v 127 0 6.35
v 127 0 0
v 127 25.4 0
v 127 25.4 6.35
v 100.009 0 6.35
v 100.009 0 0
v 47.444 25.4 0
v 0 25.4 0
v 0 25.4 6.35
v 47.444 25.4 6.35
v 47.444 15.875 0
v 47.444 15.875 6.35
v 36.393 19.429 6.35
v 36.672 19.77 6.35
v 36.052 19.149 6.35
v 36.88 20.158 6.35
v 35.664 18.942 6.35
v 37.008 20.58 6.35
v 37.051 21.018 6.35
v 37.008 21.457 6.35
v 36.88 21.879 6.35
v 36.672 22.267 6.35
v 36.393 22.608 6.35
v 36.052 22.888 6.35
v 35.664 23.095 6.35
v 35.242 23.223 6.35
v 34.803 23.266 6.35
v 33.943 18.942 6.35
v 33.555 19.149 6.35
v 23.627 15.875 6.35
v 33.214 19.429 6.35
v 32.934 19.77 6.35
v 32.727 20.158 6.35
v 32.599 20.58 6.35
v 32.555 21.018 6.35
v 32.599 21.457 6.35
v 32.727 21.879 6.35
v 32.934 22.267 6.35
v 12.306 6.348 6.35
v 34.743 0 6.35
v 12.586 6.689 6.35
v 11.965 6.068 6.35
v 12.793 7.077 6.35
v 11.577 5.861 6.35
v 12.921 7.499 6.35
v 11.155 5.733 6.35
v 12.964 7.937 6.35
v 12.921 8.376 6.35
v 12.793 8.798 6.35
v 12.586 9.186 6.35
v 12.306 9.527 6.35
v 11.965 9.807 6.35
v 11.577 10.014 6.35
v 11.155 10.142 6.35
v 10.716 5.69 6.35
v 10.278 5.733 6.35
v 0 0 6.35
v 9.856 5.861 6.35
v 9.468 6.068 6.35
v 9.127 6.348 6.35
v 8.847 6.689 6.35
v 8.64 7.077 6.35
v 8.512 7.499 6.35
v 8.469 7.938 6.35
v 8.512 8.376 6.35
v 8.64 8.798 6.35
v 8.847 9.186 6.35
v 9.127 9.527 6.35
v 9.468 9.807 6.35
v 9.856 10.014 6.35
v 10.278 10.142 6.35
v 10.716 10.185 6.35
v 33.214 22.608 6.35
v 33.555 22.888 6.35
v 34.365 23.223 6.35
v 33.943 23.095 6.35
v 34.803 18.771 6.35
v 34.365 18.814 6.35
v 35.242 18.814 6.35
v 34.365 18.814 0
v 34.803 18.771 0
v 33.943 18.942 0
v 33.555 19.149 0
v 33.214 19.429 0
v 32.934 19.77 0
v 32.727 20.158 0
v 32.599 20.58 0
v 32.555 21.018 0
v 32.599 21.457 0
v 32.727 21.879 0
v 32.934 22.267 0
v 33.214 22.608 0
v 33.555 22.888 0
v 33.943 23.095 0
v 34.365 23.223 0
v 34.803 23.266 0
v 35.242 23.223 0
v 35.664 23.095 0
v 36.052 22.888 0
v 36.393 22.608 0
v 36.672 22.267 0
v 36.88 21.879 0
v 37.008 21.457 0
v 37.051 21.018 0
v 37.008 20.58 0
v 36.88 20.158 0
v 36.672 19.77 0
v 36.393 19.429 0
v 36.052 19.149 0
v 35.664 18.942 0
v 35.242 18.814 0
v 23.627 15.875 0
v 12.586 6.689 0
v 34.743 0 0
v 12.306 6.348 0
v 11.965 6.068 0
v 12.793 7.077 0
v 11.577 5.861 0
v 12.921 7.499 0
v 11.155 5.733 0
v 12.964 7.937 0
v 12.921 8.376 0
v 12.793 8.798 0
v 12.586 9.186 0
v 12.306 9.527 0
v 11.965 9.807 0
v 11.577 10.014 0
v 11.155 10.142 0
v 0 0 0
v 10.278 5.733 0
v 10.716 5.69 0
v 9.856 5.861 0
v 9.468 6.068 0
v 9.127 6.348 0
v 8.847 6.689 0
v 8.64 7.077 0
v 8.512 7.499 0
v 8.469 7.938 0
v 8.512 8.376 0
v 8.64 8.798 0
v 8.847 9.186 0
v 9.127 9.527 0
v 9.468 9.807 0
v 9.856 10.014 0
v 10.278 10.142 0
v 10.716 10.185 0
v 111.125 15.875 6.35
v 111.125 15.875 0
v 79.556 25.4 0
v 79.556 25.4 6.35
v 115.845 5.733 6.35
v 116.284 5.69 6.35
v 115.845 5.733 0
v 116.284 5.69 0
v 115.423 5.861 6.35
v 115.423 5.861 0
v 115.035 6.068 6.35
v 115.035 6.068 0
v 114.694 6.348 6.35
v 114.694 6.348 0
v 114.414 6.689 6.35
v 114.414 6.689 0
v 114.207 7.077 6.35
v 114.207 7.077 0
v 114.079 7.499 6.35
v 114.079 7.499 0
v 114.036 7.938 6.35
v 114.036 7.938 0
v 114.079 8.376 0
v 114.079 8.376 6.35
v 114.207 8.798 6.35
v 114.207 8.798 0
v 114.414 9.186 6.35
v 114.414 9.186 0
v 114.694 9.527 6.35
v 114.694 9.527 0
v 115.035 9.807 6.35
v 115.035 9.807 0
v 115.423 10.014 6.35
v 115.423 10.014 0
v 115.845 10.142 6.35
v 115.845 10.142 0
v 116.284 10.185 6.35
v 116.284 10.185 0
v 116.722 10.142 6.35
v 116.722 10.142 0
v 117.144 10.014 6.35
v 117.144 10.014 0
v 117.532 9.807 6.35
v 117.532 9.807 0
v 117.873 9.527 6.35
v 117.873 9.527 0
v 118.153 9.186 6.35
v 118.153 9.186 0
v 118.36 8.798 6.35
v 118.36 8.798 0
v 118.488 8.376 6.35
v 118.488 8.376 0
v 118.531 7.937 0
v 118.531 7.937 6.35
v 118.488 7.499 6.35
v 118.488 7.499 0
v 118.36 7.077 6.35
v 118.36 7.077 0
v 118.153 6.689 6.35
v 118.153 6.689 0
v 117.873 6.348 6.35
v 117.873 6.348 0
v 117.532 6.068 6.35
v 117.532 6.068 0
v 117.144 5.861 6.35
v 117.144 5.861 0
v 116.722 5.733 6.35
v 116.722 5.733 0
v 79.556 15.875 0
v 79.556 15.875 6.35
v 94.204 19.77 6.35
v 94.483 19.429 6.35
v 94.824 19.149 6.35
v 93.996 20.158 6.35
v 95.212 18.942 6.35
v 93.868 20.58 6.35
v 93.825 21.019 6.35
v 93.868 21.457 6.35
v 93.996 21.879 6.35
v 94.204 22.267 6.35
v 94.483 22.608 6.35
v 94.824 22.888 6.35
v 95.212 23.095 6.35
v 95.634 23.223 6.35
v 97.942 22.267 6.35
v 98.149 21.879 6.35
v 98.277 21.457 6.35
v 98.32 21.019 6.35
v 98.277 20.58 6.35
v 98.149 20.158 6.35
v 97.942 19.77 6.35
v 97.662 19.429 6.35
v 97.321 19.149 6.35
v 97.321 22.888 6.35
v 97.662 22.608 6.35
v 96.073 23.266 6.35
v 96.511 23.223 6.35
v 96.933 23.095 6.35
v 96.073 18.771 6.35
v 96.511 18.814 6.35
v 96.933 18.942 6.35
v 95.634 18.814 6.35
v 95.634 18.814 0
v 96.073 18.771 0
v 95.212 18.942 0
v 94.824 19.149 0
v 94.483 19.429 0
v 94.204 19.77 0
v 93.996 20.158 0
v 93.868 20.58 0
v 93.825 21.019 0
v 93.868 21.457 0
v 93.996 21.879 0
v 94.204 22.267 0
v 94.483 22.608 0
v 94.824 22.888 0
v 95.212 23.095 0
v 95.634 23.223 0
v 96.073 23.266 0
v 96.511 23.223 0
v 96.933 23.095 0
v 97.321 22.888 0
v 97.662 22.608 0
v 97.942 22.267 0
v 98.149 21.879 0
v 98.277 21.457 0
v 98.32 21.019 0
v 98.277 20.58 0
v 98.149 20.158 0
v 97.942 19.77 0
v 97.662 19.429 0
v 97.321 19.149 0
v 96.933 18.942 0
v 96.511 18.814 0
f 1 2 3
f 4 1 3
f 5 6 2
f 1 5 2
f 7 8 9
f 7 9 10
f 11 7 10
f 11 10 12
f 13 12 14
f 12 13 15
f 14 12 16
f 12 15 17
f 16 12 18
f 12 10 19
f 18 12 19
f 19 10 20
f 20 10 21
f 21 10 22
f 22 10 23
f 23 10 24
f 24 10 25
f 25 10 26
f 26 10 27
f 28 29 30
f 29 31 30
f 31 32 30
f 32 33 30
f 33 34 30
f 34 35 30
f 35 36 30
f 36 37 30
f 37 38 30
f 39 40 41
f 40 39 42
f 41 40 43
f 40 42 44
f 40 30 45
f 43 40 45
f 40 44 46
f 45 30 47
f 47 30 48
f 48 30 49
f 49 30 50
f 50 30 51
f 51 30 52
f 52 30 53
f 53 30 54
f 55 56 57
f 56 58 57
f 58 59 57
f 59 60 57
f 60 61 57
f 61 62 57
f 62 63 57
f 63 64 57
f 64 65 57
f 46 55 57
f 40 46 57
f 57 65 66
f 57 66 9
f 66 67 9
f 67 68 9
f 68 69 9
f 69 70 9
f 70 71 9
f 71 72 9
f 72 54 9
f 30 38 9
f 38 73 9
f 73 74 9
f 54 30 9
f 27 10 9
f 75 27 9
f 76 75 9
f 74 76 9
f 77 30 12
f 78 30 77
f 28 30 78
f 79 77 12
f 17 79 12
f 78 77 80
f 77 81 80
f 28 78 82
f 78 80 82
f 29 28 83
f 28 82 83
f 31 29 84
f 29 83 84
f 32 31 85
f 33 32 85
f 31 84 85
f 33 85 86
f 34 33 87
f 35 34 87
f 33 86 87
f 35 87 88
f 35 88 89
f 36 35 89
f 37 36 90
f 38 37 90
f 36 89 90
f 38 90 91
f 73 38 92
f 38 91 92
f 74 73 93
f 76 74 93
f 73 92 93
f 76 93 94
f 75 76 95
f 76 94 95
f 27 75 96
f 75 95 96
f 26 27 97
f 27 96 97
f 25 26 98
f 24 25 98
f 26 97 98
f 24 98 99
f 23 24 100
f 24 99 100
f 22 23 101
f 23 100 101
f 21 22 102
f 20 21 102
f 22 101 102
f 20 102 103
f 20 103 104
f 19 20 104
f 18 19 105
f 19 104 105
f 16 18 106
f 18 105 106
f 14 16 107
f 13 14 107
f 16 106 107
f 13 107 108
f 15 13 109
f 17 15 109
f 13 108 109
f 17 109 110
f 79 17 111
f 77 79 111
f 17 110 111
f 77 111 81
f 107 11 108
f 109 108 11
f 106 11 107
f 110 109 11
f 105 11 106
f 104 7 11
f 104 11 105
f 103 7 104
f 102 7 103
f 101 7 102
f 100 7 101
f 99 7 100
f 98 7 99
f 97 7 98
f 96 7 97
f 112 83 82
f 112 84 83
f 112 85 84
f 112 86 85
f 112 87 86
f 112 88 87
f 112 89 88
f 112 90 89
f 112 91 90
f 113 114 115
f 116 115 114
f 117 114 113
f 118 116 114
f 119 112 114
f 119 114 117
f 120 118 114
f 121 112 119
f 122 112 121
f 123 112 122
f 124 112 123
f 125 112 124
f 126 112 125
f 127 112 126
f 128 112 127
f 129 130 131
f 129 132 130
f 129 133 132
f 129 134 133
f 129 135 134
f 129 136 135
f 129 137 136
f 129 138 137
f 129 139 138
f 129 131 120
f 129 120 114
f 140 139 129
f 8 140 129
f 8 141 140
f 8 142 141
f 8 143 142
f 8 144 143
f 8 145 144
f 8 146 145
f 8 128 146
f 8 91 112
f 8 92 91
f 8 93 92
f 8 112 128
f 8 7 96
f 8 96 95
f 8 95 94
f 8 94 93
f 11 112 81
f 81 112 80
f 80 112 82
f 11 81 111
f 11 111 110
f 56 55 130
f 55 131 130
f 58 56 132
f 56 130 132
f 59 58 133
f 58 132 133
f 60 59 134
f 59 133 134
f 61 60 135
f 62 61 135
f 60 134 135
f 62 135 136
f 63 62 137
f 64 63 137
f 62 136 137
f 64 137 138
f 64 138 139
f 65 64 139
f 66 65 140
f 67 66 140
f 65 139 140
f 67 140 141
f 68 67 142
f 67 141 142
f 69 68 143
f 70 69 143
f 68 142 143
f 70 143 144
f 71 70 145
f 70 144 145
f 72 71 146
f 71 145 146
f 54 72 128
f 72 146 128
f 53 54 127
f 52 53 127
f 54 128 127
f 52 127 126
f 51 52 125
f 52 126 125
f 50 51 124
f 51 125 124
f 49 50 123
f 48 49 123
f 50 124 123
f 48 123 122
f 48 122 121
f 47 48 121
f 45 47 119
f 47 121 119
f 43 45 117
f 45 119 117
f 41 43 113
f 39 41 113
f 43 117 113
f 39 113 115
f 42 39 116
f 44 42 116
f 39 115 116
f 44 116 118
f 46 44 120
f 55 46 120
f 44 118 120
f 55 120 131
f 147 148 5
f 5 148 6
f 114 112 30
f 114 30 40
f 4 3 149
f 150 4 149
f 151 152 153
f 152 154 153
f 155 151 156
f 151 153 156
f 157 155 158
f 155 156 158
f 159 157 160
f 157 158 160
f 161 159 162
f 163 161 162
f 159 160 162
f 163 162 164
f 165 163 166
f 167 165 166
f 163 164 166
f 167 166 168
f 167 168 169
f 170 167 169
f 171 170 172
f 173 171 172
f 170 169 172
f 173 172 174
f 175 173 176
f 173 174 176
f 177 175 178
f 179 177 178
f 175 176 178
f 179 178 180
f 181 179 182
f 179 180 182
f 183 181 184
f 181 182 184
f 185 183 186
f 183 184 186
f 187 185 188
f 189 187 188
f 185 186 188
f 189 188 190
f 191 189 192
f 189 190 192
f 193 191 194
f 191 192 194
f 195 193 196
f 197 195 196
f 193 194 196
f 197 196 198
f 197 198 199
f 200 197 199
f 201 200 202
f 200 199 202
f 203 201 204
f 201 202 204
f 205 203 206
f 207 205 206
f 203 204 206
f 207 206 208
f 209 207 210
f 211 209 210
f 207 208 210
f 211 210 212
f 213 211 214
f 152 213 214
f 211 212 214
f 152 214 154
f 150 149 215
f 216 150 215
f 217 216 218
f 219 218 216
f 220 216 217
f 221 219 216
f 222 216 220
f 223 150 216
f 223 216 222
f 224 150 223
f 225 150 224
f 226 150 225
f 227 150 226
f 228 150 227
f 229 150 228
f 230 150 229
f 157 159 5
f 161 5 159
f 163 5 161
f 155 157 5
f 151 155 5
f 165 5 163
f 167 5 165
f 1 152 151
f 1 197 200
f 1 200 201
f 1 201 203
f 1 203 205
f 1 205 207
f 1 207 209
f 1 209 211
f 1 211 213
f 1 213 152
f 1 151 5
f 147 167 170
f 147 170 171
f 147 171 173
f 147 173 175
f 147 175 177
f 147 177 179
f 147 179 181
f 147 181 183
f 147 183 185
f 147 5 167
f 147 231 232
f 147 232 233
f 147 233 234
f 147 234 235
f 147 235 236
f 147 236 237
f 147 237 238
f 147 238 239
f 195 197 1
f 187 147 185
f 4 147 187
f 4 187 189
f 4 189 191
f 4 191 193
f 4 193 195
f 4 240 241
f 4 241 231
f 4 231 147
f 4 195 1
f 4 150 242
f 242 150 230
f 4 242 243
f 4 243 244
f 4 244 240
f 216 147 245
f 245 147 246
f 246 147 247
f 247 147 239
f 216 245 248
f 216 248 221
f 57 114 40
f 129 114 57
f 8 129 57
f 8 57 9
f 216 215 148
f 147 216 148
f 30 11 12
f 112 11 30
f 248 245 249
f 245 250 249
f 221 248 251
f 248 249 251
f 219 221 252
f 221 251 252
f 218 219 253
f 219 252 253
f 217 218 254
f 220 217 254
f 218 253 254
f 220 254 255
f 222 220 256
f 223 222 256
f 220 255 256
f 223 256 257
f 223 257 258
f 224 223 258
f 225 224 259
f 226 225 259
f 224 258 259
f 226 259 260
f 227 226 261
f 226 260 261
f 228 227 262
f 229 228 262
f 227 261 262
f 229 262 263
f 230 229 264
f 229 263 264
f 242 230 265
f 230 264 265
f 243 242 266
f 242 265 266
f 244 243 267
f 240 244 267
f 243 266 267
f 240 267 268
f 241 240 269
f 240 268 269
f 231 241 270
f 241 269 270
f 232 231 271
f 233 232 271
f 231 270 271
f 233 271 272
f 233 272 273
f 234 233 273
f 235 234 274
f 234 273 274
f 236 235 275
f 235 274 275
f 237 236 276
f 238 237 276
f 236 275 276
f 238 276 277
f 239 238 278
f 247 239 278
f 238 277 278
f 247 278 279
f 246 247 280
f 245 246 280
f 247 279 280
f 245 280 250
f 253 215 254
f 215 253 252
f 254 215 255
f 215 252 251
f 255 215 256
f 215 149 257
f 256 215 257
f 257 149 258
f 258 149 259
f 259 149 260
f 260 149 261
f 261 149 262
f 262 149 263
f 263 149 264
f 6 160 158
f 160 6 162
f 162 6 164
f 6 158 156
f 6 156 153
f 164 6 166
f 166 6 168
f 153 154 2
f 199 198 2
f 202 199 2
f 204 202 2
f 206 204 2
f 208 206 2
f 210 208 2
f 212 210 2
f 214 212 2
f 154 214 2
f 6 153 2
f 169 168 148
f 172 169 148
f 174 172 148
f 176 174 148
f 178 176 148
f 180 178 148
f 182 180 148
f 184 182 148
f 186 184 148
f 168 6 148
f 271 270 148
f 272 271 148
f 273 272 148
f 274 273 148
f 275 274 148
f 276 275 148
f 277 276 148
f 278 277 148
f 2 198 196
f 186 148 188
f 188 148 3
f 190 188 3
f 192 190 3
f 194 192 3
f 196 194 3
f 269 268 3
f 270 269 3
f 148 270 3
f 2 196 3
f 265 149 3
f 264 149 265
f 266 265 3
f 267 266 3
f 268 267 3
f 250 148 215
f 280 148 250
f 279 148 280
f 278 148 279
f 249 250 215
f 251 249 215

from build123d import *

# Parameters (mm, degrees)
BOSS_EXTRUDE1_DEPTH            = 6.35
BOSS_EXTRUDE1_2_DEPTH          = 6.35
SKETCH3_W                      = 2.2479
SKETCH3_H                      = 6.35
F_8_CLEARANCE_HOLE1_AT_2_COUNT = 2
F_8_CLEARANCE_HOLE1_AT_2_PITCH = 27.409736217
F_8_CLEARANCE_HOLE1_AT_3_COUNT = 2
F_8_CLEARANCE_HOLE1_AT_3_PITCH = 86.352641558
F_8_CLEARANCE_HOLE1_AT_4_COUNT = 2
F_8_CLEARANCE_HOLE1_AT_4_PITCH = 105.567102665


with BuildPart() as part:
    # Sketch1 → Boss-Extrude1 (new body)
    with BuildSketch(Plane.XY):
        Polygon((100.009205331, 0), (127, 0), (127, 25.4), (79.556336319, 25.4), (79.556336319, 15.875), (111.125, 15.875), align=None)
    extrude(amount=BOSS_EXTRUDE1_DEPTH)


with BuildPart() as body_2:
    # Sketch1 → Boss-Extrude1 2 (new body)
    with BuildSketch(Plane.XY):
        Polygon((0, 0), (0, 25.4), (47.443663681, 25.4), (47.443663681, 15.875), (23.626918639, 15.875), (34.742713308, 0), align=None)
    extrude(amount=BOSS_EXTRUDE1_2_DEPTH)

    # Sketch3 → #8 Clearance Hole1 (revolve, cut)
    with BuildSketch(Plane(origin=(10.716448667, 7.9375, 6.35), x_dir=(0, -1, 0), z_dir=(1, 0, 0))):
        with Locations((1.12395, 3.175)):
            Rectangle(SKETCH3_W, SKETCH3_H)
    f_8_clearance_hole1 = revolve(axis=Axis((10.716448667, 7.9375, 12.7), (0, 0, -1)), mode=Mode.SUBTRACT)

    # #8 Clearance Hole1 at 2: #8 Clearance Hole1 ×2
    with Locations(*[Vector(0.8787734442616352, 0.47723917867306637, 0) * (i * F_8_CLEARANCE_HOLE1_AT_2_PITCH) for i in range(1, F_8_CLEARANCE_HOLE1_AT_2_COUNT)]):
        add(f_8_clearance_hole1, mode=Mode.SUBTRACT)


with BuildPart() as part_1:
    add(part.part)

    # #8 Clearance Hole1 at 3: #8 Clearance Hole1 ×2
    with Locations(*[Vector(0.9884597870181576, 0.15148349562912322, 0) * (i * F_8_CLEARANCE_HOLE1_AT_3_PITCH) for i in range(1, F_8_CLEARANCE_HOLE1_AT_3_COUNT)]):
        add(f_8_clearance_hole1, mode=Mode.SUBTRACT)

    # #8 Clearance Hole1 at 4: #8 Clearance Hole1 ×2
    with Locations(*[(i * F_8_CLEARANCE_HOLE1_AT_4_PITCH, 0, 0) for i in range(1, F_8_CLEARANCE_HOLE1_AT_4_COUNT)]):
        add(f_8_clearance_hole1, mode=Mode.SUBTRACT)


solid = Compound([body_2.part, part_1.part])
